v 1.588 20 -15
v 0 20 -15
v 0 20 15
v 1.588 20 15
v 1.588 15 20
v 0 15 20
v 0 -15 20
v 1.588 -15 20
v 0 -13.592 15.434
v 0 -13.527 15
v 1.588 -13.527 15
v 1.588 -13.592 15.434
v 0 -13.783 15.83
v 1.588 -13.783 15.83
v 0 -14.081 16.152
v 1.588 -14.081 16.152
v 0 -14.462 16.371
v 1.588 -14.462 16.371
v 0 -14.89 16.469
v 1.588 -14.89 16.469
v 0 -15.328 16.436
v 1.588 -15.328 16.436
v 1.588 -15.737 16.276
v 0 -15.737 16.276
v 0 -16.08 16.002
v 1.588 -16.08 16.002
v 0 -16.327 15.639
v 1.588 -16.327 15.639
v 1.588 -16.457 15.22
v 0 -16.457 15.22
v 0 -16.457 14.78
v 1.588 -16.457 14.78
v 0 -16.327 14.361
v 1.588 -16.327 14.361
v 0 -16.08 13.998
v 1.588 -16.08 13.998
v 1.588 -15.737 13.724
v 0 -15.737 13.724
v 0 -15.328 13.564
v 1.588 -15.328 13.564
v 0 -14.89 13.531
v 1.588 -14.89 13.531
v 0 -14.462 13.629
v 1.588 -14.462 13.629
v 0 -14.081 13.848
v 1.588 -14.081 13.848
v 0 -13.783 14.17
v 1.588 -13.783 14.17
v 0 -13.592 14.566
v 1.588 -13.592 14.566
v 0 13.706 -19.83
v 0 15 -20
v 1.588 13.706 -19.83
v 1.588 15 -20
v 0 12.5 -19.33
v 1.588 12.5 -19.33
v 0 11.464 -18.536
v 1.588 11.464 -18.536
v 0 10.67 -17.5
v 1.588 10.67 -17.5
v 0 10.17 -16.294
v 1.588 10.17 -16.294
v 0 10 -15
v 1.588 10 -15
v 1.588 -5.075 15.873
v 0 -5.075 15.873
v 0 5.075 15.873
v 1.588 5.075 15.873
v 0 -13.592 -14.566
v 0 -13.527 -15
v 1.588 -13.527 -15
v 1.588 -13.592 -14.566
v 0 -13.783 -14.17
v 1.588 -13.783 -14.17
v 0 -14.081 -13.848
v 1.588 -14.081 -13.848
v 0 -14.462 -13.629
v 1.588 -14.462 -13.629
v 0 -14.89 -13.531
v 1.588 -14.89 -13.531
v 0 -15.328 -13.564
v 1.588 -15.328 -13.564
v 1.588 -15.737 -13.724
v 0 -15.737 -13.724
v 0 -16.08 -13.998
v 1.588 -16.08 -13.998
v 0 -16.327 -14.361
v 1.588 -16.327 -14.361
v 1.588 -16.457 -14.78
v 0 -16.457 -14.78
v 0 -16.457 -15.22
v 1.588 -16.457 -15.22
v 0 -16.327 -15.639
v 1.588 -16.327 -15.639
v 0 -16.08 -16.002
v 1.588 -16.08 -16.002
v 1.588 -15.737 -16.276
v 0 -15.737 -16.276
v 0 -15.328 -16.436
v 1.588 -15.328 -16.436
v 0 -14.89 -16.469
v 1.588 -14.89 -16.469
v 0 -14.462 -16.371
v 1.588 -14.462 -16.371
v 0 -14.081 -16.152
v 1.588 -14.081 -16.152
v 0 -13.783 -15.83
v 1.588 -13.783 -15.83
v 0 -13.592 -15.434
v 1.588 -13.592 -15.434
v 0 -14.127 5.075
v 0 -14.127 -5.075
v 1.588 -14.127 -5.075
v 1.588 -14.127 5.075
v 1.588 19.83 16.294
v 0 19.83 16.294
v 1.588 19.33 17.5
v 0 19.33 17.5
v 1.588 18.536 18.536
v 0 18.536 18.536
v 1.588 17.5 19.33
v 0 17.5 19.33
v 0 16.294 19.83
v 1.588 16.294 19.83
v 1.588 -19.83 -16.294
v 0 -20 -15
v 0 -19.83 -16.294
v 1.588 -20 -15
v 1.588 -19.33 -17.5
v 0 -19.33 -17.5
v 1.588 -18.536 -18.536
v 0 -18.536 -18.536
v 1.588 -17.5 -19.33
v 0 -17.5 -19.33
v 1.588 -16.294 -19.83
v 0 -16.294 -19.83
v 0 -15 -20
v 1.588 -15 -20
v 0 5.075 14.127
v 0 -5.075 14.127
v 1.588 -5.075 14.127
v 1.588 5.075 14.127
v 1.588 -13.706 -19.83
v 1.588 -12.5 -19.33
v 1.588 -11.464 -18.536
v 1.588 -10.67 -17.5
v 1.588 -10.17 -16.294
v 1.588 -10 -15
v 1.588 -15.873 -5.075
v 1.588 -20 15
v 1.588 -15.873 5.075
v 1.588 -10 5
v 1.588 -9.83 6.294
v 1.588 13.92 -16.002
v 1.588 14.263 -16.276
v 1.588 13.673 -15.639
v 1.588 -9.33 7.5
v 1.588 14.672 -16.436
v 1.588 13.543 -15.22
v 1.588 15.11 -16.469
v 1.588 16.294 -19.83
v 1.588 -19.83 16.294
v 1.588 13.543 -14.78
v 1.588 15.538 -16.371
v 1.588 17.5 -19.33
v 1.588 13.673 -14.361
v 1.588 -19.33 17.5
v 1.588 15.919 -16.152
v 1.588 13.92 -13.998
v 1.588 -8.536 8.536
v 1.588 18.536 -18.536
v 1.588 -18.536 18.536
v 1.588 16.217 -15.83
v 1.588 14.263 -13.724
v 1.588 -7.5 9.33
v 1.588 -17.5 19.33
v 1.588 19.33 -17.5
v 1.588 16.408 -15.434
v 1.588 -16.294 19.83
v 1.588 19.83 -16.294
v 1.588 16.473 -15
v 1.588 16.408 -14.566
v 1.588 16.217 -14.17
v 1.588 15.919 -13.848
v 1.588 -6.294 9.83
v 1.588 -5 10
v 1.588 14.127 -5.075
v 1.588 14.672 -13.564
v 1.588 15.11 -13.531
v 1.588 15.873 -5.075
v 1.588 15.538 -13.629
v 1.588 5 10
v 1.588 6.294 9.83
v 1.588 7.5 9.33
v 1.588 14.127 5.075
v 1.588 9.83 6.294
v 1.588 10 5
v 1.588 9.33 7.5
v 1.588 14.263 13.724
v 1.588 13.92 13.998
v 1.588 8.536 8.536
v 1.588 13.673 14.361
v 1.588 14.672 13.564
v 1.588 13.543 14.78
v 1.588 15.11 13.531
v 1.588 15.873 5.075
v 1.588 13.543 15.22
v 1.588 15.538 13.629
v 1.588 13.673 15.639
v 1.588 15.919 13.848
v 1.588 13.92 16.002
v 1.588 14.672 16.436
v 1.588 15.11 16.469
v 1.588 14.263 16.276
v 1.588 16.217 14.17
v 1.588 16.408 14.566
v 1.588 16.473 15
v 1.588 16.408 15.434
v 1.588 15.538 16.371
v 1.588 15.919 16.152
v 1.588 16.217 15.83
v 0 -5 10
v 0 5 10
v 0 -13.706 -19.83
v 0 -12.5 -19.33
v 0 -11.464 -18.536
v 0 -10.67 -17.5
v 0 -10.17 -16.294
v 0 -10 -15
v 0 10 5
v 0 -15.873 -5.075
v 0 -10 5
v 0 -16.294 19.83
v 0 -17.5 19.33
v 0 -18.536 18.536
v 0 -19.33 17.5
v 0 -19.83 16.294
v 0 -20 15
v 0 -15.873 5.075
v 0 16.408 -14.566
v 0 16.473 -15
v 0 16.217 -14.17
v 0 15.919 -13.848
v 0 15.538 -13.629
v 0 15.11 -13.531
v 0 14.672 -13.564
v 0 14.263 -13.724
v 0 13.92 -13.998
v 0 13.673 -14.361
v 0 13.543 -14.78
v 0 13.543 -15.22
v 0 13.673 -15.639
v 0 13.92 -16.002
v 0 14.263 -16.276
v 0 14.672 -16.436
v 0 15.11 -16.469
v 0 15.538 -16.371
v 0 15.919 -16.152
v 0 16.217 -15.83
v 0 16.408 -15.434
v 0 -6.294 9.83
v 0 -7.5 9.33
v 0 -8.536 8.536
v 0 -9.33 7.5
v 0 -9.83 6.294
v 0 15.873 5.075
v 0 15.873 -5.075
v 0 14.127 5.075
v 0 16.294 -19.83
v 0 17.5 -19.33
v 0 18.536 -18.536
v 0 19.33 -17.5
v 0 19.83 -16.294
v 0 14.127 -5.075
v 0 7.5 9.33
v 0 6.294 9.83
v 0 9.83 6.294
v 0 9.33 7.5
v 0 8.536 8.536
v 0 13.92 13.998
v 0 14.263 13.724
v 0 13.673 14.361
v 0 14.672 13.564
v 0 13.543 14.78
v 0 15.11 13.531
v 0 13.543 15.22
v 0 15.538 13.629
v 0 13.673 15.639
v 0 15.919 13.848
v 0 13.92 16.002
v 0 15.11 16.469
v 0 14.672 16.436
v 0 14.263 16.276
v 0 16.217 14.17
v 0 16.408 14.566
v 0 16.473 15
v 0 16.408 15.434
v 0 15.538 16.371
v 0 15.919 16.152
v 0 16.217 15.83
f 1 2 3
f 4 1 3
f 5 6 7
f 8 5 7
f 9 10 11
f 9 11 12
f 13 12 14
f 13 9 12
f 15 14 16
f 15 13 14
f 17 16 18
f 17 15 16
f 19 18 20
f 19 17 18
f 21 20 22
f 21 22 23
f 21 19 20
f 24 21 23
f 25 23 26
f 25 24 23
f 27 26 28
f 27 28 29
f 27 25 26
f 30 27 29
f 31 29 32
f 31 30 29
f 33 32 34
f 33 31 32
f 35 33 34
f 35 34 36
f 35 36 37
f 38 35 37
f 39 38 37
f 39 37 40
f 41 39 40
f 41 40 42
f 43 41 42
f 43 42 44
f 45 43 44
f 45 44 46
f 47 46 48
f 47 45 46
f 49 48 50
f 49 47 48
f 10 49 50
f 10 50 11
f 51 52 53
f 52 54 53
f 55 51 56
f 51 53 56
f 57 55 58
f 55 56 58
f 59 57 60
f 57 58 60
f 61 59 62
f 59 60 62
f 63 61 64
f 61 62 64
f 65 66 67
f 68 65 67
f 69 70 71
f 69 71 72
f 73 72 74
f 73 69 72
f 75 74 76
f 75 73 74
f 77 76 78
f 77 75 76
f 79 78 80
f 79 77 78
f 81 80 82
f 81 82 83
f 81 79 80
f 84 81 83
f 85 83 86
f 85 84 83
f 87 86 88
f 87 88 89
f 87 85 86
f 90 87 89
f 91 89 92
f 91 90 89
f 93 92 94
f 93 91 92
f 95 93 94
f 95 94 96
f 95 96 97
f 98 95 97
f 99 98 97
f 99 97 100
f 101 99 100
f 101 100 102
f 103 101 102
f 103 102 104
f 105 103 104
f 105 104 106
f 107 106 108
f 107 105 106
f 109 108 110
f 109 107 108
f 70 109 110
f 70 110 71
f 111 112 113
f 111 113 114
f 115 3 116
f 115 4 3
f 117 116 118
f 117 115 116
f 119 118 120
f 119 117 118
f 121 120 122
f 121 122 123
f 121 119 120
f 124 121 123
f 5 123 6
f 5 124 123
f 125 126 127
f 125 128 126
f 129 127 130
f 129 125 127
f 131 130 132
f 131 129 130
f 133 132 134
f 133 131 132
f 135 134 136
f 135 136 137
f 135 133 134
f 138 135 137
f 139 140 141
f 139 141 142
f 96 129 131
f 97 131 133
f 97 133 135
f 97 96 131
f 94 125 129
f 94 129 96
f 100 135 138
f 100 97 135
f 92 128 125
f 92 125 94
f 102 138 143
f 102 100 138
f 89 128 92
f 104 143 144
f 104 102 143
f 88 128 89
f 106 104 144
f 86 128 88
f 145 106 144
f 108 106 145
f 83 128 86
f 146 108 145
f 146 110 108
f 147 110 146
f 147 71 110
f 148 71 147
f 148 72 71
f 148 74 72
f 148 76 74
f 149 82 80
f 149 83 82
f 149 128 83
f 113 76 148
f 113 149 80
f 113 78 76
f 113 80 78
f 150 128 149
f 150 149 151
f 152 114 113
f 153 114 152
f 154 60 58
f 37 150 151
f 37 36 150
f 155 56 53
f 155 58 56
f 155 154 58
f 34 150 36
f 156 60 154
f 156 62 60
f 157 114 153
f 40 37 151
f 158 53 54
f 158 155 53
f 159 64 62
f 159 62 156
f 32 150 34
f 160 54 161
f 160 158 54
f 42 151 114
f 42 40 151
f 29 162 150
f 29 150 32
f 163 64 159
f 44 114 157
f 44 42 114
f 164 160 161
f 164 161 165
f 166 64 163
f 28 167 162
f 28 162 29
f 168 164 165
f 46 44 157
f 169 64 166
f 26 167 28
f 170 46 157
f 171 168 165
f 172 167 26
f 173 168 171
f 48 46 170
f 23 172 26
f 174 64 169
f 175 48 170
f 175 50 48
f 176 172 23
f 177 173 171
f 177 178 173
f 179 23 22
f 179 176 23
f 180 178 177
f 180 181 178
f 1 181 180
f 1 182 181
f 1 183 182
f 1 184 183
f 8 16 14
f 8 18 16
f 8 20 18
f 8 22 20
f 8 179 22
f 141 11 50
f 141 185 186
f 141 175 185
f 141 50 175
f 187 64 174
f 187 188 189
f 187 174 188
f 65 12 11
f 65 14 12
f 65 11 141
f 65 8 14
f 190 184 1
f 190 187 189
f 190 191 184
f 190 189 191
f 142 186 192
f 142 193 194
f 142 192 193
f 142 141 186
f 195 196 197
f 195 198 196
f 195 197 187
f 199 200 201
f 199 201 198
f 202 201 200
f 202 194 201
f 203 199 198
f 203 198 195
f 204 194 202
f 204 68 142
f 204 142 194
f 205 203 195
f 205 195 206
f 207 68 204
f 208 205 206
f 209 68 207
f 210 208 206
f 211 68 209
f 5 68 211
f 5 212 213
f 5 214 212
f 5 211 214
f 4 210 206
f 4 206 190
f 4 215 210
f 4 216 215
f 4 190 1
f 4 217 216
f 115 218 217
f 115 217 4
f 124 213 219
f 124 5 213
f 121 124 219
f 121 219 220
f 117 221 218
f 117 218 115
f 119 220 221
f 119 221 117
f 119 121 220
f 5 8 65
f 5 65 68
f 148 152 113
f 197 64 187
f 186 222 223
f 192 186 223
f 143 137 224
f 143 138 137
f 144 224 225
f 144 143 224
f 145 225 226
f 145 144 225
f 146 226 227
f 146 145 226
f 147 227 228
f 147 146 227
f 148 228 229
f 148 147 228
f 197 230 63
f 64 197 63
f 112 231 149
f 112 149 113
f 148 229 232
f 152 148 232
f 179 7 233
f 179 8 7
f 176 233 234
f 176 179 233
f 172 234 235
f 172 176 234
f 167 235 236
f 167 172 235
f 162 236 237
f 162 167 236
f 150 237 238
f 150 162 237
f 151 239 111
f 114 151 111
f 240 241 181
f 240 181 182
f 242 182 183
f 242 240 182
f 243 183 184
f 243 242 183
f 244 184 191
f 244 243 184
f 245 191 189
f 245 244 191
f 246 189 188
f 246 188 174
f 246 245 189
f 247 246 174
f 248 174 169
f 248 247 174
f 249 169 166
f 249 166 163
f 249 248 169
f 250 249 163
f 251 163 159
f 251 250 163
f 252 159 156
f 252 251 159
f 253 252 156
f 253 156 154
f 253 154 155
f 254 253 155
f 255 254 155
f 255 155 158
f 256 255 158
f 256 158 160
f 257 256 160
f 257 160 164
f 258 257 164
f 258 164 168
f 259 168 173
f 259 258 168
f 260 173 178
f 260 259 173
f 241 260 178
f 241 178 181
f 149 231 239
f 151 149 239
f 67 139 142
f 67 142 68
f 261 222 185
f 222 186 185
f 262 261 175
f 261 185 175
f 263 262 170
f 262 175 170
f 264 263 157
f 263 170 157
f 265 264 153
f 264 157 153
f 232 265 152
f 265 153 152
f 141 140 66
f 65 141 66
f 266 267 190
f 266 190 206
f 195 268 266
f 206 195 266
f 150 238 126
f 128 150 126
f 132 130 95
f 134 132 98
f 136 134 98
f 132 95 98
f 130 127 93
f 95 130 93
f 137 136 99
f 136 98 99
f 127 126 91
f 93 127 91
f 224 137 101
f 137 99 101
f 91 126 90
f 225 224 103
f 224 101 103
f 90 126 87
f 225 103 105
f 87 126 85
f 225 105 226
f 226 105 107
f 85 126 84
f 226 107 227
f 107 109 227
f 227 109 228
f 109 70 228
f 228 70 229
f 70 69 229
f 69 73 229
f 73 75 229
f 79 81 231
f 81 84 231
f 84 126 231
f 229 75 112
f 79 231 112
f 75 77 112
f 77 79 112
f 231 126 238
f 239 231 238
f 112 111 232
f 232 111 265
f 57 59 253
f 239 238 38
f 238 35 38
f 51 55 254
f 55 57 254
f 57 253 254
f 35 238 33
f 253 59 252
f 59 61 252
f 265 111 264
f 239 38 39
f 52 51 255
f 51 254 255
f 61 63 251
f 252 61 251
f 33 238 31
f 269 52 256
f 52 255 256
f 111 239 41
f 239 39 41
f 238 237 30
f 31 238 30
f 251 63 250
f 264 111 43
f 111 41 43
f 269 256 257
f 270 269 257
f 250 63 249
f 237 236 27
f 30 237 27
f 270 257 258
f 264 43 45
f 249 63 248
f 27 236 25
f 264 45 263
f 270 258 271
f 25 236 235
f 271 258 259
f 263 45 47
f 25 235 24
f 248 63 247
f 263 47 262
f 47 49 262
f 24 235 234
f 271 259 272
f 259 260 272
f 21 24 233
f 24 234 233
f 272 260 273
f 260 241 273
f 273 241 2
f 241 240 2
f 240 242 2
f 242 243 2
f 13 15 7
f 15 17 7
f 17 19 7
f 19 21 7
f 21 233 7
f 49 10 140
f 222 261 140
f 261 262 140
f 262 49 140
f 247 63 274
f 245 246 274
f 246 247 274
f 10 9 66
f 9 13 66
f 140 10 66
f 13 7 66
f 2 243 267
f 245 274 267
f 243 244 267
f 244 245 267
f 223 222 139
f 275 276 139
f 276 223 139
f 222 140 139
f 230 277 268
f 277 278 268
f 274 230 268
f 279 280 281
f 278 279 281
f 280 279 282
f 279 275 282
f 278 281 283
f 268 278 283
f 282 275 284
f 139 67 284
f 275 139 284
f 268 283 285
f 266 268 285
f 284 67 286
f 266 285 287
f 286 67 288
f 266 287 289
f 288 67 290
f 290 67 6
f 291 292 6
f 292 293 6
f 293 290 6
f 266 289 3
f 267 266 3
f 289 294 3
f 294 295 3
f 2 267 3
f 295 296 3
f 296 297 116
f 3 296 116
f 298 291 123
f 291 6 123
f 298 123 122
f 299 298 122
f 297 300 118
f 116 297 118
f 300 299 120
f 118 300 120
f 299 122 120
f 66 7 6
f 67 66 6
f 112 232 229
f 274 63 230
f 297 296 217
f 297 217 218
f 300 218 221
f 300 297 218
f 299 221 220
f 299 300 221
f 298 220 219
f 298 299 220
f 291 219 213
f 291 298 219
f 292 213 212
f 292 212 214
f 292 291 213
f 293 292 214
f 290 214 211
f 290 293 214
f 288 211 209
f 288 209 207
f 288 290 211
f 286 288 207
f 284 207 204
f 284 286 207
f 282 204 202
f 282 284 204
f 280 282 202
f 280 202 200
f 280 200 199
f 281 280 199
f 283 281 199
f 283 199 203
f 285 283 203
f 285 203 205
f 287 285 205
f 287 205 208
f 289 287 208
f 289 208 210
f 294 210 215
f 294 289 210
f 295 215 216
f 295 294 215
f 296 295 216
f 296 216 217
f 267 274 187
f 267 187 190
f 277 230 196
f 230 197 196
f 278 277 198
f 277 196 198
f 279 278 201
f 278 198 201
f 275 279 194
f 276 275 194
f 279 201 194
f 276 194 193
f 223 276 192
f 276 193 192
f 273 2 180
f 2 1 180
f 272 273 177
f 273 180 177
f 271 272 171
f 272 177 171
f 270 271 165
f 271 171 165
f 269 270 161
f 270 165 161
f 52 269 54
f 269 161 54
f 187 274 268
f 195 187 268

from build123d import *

# Parameters (mm, degrees)
F0_R     = 1.4732
F0_W     = 1.74625
F0_H     = 10.15
F0_W_2   = 10.15
F0_H_2   = 1.74625
F1_DEPTH = 1.5875
F2_R     = 4.99999


# Not quite as in the source:
# - a fillet or chamfer is up to 0.001 mm smaller than in the source, because OpenCascade refuses the exact size
# - a length typed as a fraction of an inch, garbled in the dataset ("3 / 203.2 mm" for 3/8 in), is restored


with BuildPart() as f1:
    # F0 (on Right) → F1 (new body)
    with BuildSketch(Plane.YZ):
        Polygon((20, -20), (20, 20), (-20, 20), (-20, -20), (-10, -20), (-10, 10), (10, 10), (10, -20), align=None)
        with Locations((-15, -15)):
            Circle(F0_R, mode=Mode.SUBTRACT)
        with Locations((15, -15)):
            Circle(F0_R, mode=Mode.SUBTRACT)
        with Locations((-15, 0)):
            Rectangle(F0_W, F0_H, mode=Mode.SUBTRACT)
        with Locations((-15, 15)):
            Circle(F0_R, mode=Mode.SUBTRACT)
        with Locations((15, 0)):
            Rectangle(F0_W, F0_H, mode=Mode.SUBTRACT)
        with Locations((0, 15)):
            Rectangle(F0_W_2, F0_H_2, mode=Mode.SUBTRACT)
        with Locations((15, 15)):
            Circle(F0_R, mode=Mode.SUBTRACT)
    extrude(amount=F1_DEPTH)

    # F2 (radius 5 in the source; OpenCascade refuses exactly that, so slightly less here)
    f2_edges = [f1.edges().sort_by_distance(p)[0] for p in [
        (0.79375, -20, 20),
        (0.79375, -20, -20),
        (0.79375, -10, 10),
        (0.79375, -10, -20),
        (0.79375, 10, -20),
        (0.79375, 20, -20),
        (0.79375, 10, 10),
        (0.79375, 20, 20),
    ]]
    fillet(f2_edges, radius=F2_R)


solid = f1.part
